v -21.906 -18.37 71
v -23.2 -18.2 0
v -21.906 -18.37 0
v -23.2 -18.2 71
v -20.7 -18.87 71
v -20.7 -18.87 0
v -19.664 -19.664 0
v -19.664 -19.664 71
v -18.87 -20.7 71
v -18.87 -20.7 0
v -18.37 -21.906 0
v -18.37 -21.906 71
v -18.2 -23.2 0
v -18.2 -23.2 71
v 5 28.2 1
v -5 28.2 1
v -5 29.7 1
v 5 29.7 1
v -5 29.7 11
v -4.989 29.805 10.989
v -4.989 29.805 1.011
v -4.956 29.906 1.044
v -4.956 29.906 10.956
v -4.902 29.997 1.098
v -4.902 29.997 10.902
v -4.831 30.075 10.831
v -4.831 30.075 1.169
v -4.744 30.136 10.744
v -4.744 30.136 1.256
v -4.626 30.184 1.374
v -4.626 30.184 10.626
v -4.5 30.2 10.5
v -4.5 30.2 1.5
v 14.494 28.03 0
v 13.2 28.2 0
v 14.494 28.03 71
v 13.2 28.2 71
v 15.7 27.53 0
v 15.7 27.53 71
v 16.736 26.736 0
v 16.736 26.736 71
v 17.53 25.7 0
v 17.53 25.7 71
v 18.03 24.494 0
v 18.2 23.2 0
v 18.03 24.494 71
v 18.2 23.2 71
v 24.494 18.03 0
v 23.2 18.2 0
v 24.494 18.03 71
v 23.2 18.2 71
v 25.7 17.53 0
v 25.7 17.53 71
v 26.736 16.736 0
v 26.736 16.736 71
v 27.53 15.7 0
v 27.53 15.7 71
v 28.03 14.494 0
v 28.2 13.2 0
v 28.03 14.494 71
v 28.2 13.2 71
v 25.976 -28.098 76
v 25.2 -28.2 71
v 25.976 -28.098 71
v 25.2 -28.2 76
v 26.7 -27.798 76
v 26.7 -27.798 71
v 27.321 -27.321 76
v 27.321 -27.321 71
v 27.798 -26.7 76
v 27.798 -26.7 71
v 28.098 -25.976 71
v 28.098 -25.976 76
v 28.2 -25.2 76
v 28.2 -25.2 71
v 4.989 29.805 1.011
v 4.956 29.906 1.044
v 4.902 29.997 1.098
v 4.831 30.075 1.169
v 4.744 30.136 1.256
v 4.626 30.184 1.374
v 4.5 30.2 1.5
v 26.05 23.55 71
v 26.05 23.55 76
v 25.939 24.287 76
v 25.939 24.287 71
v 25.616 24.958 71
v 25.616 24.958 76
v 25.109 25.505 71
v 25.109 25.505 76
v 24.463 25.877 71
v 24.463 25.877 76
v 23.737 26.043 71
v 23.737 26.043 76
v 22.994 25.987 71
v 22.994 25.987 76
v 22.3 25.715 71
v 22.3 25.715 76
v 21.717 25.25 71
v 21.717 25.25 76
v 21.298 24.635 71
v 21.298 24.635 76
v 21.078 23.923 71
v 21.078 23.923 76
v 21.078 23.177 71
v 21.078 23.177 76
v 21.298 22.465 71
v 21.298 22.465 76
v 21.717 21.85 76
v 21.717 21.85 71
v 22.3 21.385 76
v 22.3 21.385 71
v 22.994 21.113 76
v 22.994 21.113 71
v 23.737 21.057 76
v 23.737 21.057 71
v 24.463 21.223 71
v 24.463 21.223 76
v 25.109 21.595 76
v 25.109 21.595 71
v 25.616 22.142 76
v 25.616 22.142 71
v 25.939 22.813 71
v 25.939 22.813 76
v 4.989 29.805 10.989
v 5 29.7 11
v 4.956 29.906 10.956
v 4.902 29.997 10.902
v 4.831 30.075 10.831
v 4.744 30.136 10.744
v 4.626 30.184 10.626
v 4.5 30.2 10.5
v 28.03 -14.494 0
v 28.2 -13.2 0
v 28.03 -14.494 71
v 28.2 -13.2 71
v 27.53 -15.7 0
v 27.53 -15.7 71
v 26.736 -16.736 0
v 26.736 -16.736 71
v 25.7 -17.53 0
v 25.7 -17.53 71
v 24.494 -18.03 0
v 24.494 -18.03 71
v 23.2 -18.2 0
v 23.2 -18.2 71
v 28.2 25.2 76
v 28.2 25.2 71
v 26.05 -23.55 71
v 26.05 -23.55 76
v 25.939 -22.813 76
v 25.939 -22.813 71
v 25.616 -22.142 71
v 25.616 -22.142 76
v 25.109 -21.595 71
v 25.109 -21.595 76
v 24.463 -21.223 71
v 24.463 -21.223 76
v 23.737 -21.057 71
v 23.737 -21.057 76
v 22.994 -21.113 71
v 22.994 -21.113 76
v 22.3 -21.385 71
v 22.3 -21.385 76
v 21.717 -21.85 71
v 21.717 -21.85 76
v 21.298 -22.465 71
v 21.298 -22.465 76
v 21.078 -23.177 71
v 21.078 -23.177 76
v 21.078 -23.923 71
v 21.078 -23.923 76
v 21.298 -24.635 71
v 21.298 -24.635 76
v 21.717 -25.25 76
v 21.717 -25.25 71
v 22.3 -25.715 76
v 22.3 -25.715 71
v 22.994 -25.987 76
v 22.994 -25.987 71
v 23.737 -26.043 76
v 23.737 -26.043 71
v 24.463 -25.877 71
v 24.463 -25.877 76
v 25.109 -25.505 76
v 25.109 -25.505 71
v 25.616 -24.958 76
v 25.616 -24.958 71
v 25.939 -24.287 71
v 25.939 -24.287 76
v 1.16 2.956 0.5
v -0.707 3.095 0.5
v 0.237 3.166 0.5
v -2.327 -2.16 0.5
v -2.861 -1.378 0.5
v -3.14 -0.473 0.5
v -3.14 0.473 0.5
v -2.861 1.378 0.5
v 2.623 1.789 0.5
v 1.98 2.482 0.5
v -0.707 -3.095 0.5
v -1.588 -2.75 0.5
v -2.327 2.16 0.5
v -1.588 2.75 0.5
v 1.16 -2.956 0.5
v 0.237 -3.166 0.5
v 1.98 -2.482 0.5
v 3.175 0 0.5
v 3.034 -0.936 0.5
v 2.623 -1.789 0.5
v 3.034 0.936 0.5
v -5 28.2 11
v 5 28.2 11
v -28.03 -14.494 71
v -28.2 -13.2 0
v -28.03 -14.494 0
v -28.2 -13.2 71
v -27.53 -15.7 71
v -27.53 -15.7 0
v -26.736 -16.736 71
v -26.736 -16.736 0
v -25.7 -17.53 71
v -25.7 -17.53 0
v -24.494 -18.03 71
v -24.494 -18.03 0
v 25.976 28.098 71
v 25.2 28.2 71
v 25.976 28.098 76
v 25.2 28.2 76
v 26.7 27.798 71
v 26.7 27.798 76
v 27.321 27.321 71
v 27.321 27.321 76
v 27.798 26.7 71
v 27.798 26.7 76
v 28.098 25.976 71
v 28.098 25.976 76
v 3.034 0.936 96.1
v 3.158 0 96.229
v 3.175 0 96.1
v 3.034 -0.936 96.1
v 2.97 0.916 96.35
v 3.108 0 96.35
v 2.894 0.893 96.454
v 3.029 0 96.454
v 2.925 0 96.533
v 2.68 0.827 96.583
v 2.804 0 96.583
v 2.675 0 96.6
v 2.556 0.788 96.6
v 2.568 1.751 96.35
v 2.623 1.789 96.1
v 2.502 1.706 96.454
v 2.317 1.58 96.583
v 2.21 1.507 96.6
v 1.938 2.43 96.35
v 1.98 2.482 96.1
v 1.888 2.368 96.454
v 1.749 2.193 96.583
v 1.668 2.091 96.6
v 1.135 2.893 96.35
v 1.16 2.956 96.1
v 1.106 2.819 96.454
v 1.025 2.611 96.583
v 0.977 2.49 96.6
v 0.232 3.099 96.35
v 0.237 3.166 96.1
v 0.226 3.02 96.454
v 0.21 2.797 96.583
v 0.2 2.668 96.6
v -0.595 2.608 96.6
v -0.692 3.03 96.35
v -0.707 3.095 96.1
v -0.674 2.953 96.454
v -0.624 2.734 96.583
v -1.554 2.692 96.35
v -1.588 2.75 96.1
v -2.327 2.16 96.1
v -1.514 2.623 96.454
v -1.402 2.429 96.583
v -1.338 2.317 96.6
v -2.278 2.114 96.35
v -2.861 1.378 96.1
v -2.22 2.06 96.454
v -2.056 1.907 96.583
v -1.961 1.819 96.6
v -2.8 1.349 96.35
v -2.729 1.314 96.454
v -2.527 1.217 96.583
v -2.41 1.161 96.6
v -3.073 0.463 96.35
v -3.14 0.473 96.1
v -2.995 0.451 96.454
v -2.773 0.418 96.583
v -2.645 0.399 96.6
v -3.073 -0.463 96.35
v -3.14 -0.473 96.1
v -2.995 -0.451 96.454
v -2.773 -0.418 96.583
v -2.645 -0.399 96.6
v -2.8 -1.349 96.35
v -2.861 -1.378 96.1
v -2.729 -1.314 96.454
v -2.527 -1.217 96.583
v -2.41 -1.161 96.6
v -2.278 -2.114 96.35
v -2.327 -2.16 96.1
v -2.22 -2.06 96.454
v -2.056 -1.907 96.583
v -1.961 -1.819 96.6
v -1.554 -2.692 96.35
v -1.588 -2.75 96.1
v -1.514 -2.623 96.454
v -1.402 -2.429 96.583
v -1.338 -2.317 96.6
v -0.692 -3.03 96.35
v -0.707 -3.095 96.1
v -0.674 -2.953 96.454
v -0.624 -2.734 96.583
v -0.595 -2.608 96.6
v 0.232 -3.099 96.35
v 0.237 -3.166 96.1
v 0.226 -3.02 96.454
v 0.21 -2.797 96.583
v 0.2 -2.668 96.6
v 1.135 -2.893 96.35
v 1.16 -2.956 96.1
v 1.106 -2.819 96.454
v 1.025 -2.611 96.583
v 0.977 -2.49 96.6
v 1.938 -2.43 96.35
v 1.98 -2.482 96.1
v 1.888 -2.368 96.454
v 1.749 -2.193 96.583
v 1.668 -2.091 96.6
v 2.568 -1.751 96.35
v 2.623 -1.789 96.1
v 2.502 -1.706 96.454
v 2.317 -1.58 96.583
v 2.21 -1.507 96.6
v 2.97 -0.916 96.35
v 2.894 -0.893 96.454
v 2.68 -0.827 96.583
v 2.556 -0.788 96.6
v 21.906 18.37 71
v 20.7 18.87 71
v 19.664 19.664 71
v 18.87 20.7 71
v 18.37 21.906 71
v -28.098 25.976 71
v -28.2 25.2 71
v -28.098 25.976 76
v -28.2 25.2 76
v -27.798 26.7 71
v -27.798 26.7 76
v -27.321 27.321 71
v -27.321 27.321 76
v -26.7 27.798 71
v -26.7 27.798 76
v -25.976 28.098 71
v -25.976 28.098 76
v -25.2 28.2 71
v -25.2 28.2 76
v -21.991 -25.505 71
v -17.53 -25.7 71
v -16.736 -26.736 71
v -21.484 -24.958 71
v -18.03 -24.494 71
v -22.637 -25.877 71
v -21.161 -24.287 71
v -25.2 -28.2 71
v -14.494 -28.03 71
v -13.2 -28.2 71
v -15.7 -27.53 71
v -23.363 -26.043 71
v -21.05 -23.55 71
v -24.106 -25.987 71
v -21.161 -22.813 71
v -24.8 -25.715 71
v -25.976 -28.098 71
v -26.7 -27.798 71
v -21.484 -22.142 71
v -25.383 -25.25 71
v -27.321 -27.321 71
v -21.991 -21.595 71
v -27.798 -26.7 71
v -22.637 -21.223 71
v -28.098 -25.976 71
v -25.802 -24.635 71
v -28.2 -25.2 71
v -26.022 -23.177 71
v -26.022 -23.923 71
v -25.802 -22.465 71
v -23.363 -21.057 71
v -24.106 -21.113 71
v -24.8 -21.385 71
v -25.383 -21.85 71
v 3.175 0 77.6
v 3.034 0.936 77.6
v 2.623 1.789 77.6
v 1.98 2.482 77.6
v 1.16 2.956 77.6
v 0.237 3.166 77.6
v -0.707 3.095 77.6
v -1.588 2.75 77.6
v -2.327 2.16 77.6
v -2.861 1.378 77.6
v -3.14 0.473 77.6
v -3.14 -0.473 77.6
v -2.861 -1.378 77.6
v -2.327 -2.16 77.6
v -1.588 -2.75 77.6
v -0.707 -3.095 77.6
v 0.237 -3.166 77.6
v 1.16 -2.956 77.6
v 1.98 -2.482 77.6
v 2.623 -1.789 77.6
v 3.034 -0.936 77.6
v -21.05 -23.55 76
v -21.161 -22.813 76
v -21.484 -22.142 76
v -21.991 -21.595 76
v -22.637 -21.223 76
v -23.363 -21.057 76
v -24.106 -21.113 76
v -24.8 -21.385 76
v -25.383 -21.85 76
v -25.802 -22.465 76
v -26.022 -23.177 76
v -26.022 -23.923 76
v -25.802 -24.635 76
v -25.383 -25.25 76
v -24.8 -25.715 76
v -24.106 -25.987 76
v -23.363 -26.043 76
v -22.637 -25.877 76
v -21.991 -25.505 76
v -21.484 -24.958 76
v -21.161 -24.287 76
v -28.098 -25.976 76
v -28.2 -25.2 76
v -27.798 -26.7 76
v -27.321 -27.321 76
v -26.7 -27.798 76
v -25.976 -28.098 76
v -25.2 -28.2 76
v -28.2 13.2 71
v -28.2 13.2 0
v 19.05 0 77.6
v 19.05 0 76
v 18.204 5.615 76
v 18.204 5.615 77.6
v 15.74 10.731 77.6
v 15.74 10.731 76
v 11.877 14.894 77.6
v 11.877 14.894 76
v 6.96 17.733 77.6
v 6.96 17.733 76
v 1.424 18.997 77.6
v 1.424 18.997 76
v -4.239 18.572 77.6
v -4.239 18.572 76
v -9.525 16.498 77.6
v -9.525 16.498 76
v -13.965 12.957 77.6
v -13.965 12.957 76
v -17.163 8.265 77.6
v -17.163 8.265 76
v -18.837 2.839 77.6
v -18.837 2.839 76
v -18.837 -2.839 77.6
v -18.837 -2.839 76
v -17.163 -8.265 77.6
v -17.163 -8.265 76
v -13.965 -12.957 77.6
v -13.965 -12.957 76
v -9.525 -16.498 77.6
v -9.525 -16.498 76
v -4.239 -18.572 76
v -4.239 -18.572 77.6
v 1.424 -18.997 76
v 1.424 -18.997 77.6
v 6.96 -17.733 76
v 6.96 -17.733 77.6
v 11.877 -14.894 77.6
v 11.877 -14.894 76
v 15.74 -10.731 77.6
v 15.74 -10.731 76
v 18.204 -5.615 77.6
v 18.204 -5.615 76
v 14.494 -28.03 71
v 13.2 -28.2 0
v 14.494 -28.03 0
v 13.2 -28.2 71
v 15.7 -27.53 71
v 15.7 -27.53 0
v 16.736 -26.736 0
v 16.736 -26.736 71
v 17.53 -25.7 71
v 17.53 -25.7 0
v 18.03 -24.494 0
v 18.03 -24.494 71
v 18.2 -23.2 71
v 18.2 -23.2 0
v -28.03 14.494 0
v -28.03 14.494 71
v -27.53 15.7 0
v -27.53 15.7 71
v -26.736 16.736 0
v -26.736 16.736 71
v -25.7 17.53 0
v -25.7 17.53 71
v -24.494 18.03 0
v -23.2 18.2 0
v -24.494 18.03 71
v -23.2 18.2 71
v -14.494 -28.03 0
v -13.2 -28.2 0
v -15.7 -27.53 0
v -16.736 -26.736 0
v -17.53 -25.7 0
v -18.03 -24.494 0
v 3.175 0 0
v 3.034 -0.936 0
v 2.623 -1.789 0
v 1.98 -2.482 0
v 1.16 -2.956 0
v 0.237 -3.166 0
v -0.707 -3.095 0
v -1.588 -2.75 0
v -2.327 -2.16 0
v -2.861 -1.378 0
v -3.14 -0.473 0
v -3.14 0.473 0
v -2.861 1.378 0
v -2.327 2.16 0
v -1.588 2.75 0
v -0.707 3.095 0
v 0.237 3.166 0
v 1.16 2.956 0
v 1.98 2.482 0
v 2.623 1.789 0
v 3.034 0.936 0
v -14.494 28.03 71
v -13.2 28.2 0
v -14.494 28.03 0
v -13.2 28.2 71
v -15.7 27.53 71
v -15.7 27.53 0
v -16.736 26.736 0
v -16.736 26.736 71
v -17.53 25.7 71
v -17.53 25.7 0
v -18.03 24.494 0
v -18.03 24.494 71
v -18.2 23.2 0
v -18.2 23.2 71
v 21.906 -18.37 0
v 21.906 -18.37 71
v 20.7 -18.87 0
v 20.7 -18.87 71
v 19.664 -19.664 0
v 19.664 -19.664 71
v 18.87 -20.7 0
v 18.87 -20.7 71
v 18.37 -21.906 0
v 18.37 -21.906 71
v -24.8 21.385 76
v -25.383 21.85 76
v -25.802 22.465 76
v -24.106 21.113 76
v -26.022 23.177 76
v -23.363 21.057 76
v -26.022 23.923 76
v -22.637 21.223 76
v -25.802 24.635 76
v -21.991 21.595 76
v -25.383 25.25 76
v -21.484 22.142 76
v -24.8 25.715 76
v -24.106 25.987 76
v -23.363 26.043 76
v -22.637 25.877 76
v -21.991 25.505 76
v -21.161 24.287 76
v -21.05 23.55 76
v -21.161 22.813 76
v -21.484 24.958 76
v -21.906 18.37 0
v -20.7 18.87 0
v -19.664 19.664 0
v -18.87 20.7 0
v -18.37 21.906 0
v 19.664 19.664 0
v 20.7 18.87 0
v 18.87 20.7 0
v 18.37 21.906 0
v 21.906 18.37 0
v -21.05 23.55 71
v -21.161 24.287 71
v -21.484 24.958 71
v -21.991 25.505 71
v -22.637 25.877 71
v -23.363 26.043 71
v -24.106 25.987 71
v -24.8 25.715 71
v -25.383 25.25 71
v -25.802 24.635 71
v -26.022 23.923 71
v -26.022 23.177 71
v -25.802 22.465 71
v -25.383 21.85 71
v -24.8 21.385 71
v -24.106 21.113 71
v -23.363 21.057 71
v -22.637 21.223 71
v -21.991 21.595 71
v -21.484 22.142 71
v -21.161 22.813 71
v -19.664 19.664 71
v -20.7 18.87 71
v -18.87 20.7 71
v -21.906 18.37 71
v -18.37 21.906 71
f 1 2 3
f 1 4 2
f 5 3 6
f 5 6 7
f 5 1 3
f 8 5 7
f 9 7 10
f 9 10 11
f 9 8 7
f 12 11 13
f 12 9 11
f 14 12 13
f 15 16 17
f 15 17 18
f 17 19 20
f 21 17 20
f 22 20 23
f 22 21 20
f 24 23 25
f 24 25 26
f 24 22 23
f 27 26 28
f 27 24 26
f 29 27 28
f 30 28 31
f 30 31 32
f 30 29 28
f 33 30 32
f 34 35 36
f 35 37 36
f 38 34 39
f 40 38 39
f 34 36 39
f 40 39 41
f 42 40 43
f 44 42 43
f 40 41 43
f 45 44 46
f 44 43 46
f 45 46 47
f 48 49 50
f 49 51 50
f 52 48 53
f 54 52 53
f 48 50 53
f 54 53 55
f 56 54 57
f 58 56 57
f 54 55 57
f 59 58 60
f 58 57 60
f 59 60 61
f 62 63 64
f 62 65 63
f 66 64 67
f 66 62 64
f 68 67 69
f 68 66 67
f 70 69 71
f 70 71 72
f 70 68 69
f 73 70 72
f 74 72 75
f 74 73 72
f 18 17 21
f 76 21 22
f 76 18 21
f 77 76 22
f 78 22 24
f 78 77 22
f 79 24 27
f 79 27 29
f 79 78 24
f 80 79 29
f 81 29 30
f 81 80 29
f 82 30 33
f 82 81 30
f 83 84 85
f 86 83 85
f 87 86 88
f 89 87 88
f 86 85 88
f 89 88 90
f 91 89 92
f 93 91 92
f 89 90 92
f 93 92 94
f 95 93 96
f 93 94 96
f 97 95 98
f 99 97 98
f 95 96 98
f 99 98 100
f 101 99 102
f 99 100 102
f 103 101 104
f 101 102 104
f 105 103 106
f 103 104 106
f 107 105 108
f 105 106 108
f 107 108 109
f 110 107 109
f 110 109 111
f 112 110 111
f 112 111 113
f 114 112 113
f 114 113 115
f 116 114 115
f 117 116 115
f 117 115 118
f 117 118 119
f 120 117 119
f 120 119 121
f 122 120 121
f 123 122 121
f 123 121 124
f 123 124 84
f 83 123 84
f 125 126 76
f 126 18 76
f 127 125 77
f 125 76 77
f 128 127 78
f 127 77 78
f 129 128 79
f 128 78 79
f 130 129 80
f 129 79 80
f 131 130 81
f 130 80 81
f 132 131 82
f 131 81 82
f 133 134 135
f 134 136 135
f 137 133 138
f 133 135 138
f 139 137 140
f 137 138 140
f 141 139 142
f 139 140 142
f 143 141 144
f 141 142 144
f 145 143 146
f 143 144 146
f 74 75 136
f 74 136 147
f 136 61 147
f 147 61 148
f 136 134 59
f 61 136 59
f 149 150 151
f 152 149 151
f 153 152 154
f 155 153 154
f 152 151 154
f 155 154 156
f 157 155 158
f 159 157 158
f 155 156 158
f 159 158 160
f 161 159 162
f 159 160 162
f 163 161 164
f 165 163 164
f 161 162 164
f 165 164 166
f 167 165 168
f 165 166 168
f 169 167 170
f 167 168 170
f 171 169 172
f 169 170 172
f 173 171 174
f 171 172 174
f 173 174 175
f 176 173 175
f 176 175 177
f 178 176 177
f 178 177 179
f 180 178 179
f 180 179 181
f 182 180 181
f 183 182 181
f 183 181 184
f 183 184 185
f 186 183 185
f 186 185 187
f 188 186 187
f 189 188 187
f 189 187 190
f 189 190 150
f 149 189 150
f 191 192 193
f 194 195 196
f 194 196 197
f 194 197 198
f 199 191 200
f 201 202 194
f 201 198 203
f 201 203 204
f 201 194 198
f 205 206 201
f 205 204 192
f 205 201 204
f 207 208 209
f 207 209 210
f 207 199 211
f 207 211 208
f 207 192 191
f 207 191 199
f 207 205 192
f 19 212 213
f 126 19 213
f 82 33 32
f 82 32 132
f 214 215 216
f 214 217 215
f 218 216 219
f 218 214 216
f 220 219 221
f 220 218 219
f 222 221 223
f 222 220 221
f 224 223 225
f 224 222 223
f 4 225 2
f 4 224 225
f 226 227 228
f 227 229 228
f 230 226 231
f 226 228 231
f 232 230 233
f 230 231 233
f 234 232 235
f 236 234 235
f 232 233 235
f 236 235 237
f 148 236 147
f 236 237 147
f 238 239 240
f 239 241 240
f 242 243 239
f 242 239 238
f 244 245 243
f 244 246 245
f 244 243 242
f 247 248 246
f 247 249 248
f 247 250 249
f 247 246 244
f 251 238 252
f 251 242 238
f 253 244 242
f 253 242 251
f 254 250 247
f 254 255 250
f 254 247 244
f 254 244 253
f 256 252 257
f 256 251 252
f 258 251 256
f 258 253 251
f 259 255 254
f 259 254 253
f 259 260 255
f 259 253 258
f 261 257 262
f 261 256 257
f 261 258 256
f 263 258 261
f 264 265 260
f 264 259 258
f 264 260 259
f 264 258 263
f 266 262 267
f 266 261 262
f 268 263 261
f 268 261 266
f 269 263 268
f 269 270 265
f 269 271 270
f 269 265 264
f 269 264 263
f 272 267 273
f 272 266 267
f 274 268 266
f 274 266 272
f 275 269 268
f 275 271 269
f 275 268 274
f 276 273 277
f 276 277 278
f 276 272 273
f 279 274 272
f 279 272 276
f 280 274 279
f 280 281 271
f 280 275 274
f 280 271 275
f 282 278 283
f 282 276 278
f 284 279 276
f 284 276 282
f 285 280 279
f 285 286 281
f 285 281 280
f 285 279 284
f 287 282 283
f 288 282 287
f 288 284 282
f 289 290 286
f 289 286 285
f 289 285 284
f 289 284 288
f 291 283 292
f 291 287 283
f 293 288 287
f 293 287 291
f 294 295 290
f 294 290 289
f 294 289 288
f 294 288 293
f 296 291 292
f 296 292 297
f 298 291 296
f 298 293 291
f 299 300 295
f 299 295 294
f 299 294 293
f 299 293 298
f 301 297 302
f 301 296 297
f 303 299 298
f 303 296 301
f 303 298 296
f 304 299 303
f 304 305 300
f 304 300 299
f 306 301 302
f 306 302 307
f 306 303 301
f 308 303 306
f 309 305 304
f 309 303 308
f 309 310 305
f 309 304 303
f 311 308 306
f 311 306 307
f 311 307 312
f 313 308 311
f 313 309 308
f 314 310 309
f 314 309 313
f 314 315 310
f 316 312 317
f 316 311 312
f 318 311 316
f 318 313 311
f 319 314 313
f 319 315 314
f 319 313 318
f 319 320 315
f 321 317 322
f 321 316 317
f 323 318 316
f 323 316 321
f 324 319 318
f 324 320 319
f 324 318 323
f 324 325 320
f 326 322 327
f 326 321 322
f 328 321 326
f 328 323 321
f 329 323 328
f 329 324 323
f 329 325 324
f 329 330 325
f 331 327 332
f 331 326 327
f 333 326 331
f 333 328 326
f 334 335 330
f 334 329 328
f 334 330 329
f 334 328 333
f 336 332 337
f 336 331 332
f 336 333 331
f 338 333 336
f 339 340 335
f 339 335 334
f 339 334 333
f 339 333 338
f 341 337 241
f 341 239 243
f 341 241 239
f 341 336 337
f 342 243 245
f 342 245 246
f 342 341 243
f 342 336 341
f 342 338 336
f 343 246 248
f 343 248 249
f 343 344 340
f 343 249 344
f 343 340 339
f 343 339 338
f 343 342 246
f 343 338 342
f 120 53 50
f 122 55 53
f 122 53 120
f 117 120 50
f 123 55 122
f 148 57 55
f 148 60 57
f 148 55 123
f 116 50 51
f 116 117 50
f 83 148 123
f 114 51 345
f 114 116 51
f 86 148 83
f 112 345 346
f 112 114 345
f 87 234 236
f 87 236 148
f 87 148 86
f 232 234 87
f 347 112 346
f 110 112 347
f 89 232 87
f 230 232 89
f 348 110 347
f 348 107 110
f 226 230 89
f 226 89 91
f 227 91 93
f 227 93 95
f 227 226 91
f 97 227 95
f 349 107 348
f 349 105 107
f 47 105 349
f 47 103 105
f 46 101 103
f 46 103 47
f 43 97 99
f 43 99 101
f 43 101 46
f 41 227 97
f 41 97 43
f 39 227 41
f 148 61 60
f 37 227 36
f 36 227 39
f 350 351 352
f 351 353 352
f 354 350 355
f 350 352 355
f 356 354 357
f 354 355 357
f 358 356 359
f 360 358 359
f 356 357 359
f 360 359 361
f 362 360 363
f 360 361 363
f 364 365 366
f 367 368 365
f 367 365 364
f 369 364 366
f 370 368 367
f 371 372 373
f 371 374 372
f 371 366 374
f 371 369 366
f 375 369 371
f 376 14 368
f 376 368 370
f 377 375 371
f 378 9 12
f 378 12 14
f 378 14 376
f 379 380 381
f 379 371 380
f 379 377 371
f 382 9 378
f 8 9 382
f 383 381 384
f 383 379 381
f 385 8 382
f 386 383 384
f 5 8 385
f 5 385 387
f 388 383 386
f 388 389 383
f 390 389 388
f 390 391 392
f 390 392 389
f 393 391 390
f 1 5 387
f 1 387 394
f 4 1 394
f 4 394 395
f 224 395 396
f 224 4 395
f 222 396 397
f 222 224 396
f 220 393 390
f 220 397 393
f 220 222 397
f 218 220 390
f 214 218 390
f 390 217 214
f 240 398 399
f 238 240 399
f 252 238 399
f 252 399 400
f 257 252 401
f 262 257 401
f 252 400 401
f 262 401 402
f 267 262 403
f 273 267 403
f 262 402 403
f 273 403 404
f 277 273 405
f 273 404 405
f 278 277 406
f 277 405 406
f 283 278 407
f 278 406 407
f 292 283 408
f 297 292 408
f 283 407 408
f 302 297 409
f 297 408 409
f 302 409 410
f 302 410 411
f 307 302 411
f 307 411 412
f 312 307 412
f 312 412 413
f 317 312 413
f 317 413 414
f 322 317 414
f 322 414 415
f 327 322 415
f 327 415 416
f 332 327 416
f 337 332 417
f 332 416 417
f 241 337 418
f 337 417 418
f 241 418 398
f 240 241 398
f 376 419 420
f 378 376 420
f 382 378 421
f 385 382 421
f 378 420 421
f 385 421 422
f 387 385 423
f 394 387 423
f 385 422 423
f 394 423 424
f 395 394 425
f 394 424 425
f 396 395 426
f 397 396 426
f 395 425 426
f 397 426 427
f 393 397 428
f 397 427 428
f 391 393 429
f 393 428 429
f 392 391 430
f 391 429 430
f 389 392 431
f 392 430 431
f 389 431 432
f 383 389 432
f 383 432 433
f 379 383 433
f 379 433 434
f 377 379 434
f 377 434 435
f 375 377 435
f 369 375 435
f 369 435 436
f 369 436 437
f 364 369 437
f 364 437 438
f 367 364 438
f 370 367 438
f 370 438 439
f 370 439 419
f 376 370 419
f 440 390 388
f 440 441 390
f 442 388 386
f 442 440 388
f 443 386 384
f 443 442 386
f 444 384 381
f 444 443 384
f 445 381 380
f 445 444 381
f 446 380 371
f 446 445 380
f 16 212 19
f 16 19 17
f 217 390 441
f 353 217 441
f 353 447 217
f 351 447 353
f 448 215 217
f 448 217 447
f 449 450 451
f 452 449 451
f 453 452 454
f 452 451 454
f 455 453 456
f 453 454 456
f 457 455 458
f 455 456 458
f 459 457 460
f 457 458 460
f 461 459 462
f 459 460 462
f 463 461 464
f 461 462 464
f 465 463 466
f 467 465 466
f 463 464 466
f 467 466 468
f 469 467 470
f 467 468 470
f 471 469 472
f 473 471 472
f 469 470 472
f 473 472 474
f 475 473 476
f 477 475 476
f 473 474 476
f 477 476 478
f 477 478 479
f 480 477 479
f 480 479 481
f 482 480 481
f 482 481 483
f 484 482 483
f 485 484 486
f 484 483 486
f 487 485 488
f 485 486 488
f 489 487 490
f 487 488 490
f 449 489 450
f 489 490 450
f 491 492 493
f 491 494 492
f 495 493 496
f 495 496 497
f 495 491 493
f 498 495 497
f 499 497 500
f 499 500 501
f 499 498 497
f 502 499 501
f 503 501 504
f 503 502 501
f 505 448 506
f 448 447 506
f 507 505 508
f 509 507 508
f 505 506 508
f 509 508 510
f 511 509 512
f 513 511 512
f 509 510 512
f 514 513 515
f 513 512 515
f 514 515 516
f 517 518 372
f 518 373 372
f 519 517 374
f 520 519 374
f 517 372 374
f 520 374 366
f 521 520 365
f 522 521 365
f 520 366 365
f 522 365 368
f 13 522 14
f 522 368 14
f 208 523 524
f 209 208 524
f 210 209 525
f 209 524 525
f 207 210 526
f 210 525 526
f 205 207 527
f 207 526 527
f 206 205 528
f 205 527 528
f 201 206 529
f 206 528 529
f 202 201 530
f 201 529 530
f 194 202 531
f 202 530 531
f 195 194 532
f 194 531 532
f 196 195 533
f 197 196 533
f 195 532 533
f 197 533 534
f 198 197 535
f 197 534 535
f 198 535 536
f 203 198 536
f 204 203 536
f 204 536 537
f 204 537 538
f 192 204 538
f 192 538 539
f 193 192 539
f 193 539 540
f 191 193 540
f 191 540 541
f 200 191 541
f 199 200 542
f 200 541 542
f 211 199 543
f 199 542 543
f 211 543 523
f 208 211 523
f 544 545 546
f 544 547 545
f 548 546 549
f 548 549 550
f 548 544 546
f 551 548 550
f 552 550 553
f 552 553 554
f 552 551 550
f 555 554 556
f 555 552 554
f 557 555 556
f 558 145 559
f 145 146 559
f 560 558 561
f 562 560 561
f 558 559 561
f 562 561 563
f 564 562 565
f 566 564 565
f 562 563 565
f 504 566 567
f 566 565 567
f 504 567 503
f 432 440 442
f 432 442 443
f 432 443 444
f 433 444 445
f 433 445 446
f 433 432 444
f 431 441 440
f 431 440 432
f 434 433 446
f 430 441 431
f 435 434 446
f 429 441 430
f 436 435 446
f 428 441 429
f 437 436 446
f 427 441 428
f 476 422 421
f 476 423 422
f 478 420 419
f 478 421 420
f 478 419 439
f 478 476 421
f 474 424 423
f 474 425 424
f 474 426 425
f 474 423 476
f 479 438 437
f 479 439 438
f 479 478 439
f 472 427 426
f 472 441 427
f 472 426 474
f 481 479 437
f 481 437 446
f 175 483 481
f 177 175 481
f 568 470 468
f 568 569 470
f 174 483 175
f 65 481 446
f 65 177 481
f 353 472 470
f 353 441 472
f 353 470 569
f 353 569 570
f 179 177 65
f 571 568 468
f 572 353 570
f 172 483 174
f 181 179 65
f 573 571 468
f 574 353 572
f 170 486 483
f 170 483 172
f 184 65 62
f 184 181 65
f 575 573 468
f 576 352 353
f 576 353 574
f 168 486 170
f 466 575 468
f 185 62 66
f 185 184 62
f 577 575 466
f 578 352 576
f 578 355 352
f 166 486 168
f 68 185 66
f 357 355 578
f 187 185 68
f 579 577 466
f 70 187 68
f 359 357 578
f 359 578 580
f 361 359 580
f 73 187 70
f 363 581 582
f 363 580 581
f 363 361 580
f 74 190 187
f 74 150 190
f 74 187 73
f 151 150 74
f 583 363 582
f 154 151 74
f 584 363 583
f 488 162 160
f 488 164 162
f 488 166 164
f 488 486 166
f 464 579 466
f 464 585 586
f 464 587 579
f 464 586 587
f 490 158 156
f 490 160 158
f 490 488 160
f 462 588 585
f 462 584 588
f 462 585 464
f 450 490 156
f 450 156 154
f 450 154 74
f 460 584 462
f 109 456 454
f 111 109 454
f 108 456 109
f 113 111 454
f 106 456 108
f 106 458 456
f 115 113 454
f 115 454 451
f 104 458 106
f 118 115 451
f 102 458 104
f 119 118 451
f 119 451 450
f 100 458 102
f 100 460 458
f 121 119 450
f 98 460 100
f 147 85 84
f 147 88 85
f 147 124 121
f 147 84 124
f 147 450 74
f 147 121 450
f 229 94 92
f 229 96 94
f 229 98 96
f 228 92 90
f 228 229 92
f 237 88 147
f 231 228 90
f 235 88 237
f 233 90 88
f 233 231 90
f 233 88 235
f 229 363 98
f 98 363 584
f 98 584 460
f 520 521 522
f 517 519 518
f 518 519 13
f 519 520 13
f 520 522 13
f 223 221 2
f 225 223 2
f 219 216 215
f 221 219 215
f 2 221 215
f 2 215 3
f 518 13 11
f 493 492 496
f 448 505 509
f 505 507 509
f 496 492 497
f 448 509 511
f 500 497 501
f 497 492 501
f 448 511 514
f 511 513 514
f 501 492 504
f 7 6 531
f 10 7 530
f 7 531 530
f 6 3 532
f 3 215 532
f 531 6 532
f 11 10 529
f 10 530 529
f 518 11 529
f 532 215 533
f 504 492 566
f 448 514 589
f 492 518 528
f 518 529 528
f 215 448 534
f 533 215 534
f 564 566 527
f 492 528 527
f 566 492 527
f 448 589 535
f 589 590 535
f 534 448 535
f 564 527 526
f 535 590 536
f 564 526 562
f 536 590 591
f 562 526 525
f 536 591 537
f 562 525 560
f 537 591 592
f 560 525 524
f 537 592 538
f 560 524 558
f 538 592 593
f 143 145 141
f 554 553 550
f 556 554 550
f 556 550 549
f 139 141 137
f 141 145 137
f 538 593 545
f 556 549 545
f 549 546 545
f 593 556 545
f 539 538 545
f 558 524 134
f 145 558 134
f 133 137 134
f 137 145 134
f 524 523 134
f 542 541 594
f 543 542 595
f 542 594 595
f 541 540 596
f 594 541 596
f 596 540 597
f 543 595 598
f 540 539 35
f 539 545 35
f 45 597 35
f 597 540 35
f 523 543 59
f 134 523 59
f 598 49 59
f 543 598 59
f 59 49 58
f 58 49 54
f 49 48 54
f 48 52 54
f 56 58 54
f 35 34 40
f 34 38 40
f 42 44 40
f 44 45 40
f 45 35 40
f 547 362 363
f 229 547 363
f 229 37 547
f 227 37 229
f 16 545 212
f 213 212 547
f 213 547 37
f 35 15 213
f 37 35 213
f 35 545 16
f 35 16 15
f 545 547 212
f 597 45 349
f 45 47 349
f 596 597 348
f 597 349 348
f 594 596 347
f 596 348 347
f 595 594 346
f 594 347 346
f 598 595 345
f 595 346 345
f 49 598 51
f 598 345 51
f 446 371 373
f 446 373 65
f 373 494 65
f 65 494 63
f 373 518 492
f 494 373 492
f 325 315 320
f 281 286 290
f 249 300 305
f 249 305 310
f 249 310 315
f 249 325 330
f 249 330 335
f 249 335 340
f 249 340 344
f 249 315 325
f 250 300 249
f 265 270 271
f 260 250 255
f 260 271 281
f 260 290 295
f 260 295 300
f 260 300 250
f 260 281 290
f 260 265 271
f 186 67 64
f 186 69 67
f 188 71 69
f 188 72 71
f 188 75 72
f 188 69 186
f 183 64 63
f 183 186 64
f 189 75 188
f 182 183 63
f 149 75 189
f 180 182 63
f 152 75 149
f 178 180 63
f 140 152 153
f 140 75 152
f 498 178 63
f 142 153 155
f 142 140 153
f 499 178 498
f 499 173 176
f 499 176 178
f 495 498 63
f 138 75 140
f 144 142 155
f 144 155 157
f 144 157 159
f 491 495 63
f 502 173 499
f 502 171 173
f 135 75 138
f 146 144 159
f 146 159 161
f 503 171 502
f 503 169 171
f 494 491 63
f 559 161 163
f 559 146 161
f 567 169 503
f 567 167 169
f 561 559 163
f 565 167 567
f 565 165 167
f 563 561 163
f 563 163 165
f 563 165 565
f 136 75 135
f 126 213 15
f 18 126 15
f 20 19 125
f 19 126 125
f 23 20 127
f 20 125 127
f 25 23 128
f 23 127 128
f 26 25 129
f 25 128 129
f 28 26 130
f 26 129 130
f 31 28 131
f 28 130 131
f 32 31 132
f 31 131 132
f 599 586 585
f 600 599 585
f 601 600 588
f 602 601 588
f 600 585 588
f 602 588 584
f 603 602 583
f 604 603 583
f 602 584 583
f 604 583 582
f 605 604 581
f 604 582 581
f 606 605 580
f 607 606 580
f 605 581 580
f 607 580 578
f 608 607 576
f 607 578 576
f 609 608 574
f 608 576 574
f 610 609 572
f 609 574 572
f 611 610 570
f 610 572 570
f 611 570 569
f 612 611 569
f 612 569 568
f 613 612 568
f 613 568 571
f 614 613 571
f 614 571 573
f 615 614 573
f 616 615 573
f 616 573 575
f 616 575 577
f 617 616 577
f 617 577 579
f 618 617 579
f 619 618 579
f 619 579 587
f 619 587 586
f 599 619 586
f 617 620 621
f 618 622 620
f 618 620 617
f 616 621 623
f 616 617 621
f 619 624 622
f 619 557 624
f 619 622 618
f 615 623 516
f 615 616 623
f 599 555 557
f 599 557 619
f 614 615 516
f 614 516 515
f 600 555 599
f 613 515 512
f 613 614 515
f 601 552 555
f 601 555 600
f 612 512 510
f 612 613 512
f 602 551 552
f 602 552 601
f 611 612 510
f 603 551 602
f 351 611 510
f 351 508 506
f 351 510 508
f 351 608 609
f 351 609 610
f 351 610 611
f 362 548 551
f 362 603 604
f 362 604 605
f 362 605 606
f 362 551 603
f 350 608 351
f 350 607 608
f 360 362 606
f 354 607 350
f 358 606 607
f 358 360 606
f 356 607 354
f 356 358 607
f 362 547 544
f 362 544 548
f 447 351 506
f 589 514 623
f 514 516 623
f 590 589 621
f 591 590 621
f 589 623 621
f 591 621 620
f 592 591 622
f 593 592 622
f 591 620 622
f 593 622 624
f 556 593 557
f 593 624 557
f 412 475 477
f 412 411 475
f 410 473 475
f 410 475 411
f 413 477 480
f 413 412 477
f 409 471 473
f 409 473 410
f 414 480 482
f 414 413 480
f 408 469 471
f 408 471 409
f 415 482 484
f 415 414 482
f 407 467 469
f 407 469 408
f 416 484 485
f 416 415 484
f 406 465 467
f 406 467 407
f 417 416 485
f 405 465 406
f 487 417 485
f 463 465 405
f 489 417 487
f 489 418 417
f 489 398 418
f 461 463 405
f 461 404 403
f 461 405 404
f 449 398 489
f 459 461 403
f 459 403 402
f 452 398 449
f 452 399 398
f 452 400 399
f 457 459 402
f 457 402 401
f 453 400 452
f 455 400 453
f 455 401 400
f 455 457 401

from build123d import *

# Parameters (mm, degrees)
SKETCH_1_W                  = 56.4
SKETCH_1_H                  = 56.4
EXTRUDE_1_DEPTH             = 76
SKETCH_2_R                  = 19.05
EXTRUDE_2_DEPTH             = 1.6
SKETCH_3_R                  = 3.175
EXTRUDE_3_DEPTH             = 19
SKETCH_4_R                  = 3.175
CUT_EXTRUDE_1_DEPTH         = 0.5
SKETCH_6_W                  = 10
SKETCH_6_H                  = 10
CUT_EXTRUDE_2_DEPTH         = 71
PATTERN_LINEAR_1_COUNT      = 2
PATTERN_LINEAR_1_PITCH      = 46.4
PATTERN_LINEAR_1_COUNT_DIR2 = 2
PATTERN_LINEAR_1_PITCH_DIR2 = 46.4
FILLET_1_R                  = 5
SKETCH_7_R                  = 2.5
CUT_EXTRUDE_3_DEPTH         = 71
PATTERN_LINEAR_2_COUNT      = 2
PATTERN_LINEAR_2_PITCH      = 47.1
PATTERN_LINEAR_2_COUNT_DIR2 = 2
PATTERN_LINEAR_2_PITCH_DIR2 = 47.1
FILLET_2_R                  = 3
FILLET_3_R                  = 0.5
SKETCH_8_W                  = 10
SKETCH_8_H                  = 10
EXTRUDE_4_DEPTH             = 2
FILLET_4_R                  = 0.5


with BuildPart() as part:
    # Эскиз1 → Бобышка-Вытянуть1 (new body)
    with BuildSketch(Plane.XY):
        Rectangle(SKETCH_1_W, SKETCH_1_H)
    extrude(amount=EXTRUDE_1_DEPTH)

    # Эскиз2 → Бобышка-Вытянуть2 (add)
    with BuildSketch(Plane.XY.offset(76)):
        Circle(SKETCH_2_R)
    extrude(amount=EXTRUDE_2_DEPTH)

    # Эскиз3 → Бобышка-Вытянуть3 (add)
    with BuildSketch(Plane.XY.offset(77.6)):
        Circle(SKETCH_3_R)
    extrude(amount=EXTRUDE_3_DEPTH)

    # Эскиз4 → Вырез-Вытянуть1 (cut)
    with BuildSketch(Plane(origin=(0, 0, 0), x_dir=(-1, 0, 0), z_dir=(0, 0, -1))):
        with Locations(Location((0, 0, 0), (0, 0, 180))):
            Circle(SKETCH_4_R)
    extrude(amount=-CUT_EXTRUDE_1_DEPTH, mode=Mode.SUBTRACT)

    # Эскиз6 → Вырез-Вытянуть2 (cut)
    with BuildSketch(Plane(origin=(0, 0, 0), x_dir=(-1, 0, 0), z_dir=(0, 0, -1))):
        with Locations((-23.2, 23.2)):
            Rectangle(SKETCH_6_W, SKETCH_6_H)
    cut_extrude_2 = extrude(amount=-CUT_EXTRUDE_2_DEPTH, mode=Mode.SUBTRACT)

    # Линейный массив1: Cut-Extrude 2 2 × 2
    with Locations(*[(-i * PATTERN_LINEAR_1_PITCH, -j * PATTERN_LINEAR_1_PITCH_DIR2, 0) for i in range(PATTERN_LINEAR_1_COUNT) for j in range(PATTERN_LINEAR_1_COUNT_DIR2) if (i, j) != (0, 0)]):
        add(cut_extrude_2, mode=Mode.SUBTRACT)

    # Скругление1
    fillet_1_edges = [part.edges().sort_by_distance(p)[0] for p in [
        (-28.2, 18.2, 35.5),
        (-28.2, -18.2, 35.5),
        (-18.2, -28.2, 35.5),
        (18.2, -28.2, 35.5),
        (28.2, -18.2, 35.5),
        (28.2, 18.2, 35.5),
        (-18.2, 28.2, 35.5),
        (18.2, 28.2, 35.5),
        (18.2, -18.2, 35.5),
        (-18.2, -18.2, 35.5),
        (-18.2, 18.2, 35.5),
        (18.2, 18.2, 35.5),
    ]]
    fillet(fillet_1_edges, radius=FILLET_1_R - 0.0001)  # a hair under: the kernel refuses the full size

    # Эскиз7 → Вырез-Вытянуть3 (cut)
    with BuildSketch(Plane.XY.offset(76)):
        with Locations((-23.55, 23.55)):
            Circle(SKETCH_7_R)
    cut_extrude_3 = extrude(amount=-CUT_EXTRUDE_3_DEPTH, mode=Mode.SUBTRACT)

    # Линейный массив2: Cut-Extrude 3 2 × 2
    with Locations(*[(i * PATTERN_LINEAR_2_PITCH, -j * PATTERN_LINEAR_2_PITCH_DIR2, 0) for i in range(PATTERN_LINEAR_2_COUNT) for j in range(PATTERN_LINEAR_2_COUNT_DIR2) if (i, j) != (0, 0)]):
        add(cut_extrude_3, mode=Mode.SUBTRACT)

    # Скругление2
    fillet_2_edges = [part.edges().sort_by_distance(p)[0] for p in [
        (28.2, -28.2, 73.5),
        (-28.2, -28.2, 73.5),
        (-28.2, 28.2, 73.5),
        (28.2, 28.2, 73.5),
    ]]
    fillet(fillet_2_edges, radius=FILLET_2_R)

    # Скругление3
    fillet_3_edges = [part.edges().sort_by_distance(p)[0] for p in [
        (-3.175, 0, 96.6),
    ]]
    fillet(fillet_3_edges, radius=FILLET_3_R)

    # Эскиз8 → Бобышка-Вытянуть4 (add)
    with BuildSketch(Plane(origin=(0, 28.2, 0), x_dir=(1, 0, 0), z_dir=(0, 1, 0))):
        with Locations((0, -6)):
            Rectangle(SKETCH_8_W, SKETCH_8_H)
    extrude(amount=EXTRUDE_4_DEPTH)

    # Скругление4
    fillet_4_edges = [part.edges().sort_by_distance(p)[0] for p in [
        (5, 30.2, 6),
        (0, 30.2, 1),
        (-5, 30.2, 6),
        (0, 30.2, 11),
    ]]
    fillet(fillet_4_edges, radius=FILLET_4_R)


solid = part.part
